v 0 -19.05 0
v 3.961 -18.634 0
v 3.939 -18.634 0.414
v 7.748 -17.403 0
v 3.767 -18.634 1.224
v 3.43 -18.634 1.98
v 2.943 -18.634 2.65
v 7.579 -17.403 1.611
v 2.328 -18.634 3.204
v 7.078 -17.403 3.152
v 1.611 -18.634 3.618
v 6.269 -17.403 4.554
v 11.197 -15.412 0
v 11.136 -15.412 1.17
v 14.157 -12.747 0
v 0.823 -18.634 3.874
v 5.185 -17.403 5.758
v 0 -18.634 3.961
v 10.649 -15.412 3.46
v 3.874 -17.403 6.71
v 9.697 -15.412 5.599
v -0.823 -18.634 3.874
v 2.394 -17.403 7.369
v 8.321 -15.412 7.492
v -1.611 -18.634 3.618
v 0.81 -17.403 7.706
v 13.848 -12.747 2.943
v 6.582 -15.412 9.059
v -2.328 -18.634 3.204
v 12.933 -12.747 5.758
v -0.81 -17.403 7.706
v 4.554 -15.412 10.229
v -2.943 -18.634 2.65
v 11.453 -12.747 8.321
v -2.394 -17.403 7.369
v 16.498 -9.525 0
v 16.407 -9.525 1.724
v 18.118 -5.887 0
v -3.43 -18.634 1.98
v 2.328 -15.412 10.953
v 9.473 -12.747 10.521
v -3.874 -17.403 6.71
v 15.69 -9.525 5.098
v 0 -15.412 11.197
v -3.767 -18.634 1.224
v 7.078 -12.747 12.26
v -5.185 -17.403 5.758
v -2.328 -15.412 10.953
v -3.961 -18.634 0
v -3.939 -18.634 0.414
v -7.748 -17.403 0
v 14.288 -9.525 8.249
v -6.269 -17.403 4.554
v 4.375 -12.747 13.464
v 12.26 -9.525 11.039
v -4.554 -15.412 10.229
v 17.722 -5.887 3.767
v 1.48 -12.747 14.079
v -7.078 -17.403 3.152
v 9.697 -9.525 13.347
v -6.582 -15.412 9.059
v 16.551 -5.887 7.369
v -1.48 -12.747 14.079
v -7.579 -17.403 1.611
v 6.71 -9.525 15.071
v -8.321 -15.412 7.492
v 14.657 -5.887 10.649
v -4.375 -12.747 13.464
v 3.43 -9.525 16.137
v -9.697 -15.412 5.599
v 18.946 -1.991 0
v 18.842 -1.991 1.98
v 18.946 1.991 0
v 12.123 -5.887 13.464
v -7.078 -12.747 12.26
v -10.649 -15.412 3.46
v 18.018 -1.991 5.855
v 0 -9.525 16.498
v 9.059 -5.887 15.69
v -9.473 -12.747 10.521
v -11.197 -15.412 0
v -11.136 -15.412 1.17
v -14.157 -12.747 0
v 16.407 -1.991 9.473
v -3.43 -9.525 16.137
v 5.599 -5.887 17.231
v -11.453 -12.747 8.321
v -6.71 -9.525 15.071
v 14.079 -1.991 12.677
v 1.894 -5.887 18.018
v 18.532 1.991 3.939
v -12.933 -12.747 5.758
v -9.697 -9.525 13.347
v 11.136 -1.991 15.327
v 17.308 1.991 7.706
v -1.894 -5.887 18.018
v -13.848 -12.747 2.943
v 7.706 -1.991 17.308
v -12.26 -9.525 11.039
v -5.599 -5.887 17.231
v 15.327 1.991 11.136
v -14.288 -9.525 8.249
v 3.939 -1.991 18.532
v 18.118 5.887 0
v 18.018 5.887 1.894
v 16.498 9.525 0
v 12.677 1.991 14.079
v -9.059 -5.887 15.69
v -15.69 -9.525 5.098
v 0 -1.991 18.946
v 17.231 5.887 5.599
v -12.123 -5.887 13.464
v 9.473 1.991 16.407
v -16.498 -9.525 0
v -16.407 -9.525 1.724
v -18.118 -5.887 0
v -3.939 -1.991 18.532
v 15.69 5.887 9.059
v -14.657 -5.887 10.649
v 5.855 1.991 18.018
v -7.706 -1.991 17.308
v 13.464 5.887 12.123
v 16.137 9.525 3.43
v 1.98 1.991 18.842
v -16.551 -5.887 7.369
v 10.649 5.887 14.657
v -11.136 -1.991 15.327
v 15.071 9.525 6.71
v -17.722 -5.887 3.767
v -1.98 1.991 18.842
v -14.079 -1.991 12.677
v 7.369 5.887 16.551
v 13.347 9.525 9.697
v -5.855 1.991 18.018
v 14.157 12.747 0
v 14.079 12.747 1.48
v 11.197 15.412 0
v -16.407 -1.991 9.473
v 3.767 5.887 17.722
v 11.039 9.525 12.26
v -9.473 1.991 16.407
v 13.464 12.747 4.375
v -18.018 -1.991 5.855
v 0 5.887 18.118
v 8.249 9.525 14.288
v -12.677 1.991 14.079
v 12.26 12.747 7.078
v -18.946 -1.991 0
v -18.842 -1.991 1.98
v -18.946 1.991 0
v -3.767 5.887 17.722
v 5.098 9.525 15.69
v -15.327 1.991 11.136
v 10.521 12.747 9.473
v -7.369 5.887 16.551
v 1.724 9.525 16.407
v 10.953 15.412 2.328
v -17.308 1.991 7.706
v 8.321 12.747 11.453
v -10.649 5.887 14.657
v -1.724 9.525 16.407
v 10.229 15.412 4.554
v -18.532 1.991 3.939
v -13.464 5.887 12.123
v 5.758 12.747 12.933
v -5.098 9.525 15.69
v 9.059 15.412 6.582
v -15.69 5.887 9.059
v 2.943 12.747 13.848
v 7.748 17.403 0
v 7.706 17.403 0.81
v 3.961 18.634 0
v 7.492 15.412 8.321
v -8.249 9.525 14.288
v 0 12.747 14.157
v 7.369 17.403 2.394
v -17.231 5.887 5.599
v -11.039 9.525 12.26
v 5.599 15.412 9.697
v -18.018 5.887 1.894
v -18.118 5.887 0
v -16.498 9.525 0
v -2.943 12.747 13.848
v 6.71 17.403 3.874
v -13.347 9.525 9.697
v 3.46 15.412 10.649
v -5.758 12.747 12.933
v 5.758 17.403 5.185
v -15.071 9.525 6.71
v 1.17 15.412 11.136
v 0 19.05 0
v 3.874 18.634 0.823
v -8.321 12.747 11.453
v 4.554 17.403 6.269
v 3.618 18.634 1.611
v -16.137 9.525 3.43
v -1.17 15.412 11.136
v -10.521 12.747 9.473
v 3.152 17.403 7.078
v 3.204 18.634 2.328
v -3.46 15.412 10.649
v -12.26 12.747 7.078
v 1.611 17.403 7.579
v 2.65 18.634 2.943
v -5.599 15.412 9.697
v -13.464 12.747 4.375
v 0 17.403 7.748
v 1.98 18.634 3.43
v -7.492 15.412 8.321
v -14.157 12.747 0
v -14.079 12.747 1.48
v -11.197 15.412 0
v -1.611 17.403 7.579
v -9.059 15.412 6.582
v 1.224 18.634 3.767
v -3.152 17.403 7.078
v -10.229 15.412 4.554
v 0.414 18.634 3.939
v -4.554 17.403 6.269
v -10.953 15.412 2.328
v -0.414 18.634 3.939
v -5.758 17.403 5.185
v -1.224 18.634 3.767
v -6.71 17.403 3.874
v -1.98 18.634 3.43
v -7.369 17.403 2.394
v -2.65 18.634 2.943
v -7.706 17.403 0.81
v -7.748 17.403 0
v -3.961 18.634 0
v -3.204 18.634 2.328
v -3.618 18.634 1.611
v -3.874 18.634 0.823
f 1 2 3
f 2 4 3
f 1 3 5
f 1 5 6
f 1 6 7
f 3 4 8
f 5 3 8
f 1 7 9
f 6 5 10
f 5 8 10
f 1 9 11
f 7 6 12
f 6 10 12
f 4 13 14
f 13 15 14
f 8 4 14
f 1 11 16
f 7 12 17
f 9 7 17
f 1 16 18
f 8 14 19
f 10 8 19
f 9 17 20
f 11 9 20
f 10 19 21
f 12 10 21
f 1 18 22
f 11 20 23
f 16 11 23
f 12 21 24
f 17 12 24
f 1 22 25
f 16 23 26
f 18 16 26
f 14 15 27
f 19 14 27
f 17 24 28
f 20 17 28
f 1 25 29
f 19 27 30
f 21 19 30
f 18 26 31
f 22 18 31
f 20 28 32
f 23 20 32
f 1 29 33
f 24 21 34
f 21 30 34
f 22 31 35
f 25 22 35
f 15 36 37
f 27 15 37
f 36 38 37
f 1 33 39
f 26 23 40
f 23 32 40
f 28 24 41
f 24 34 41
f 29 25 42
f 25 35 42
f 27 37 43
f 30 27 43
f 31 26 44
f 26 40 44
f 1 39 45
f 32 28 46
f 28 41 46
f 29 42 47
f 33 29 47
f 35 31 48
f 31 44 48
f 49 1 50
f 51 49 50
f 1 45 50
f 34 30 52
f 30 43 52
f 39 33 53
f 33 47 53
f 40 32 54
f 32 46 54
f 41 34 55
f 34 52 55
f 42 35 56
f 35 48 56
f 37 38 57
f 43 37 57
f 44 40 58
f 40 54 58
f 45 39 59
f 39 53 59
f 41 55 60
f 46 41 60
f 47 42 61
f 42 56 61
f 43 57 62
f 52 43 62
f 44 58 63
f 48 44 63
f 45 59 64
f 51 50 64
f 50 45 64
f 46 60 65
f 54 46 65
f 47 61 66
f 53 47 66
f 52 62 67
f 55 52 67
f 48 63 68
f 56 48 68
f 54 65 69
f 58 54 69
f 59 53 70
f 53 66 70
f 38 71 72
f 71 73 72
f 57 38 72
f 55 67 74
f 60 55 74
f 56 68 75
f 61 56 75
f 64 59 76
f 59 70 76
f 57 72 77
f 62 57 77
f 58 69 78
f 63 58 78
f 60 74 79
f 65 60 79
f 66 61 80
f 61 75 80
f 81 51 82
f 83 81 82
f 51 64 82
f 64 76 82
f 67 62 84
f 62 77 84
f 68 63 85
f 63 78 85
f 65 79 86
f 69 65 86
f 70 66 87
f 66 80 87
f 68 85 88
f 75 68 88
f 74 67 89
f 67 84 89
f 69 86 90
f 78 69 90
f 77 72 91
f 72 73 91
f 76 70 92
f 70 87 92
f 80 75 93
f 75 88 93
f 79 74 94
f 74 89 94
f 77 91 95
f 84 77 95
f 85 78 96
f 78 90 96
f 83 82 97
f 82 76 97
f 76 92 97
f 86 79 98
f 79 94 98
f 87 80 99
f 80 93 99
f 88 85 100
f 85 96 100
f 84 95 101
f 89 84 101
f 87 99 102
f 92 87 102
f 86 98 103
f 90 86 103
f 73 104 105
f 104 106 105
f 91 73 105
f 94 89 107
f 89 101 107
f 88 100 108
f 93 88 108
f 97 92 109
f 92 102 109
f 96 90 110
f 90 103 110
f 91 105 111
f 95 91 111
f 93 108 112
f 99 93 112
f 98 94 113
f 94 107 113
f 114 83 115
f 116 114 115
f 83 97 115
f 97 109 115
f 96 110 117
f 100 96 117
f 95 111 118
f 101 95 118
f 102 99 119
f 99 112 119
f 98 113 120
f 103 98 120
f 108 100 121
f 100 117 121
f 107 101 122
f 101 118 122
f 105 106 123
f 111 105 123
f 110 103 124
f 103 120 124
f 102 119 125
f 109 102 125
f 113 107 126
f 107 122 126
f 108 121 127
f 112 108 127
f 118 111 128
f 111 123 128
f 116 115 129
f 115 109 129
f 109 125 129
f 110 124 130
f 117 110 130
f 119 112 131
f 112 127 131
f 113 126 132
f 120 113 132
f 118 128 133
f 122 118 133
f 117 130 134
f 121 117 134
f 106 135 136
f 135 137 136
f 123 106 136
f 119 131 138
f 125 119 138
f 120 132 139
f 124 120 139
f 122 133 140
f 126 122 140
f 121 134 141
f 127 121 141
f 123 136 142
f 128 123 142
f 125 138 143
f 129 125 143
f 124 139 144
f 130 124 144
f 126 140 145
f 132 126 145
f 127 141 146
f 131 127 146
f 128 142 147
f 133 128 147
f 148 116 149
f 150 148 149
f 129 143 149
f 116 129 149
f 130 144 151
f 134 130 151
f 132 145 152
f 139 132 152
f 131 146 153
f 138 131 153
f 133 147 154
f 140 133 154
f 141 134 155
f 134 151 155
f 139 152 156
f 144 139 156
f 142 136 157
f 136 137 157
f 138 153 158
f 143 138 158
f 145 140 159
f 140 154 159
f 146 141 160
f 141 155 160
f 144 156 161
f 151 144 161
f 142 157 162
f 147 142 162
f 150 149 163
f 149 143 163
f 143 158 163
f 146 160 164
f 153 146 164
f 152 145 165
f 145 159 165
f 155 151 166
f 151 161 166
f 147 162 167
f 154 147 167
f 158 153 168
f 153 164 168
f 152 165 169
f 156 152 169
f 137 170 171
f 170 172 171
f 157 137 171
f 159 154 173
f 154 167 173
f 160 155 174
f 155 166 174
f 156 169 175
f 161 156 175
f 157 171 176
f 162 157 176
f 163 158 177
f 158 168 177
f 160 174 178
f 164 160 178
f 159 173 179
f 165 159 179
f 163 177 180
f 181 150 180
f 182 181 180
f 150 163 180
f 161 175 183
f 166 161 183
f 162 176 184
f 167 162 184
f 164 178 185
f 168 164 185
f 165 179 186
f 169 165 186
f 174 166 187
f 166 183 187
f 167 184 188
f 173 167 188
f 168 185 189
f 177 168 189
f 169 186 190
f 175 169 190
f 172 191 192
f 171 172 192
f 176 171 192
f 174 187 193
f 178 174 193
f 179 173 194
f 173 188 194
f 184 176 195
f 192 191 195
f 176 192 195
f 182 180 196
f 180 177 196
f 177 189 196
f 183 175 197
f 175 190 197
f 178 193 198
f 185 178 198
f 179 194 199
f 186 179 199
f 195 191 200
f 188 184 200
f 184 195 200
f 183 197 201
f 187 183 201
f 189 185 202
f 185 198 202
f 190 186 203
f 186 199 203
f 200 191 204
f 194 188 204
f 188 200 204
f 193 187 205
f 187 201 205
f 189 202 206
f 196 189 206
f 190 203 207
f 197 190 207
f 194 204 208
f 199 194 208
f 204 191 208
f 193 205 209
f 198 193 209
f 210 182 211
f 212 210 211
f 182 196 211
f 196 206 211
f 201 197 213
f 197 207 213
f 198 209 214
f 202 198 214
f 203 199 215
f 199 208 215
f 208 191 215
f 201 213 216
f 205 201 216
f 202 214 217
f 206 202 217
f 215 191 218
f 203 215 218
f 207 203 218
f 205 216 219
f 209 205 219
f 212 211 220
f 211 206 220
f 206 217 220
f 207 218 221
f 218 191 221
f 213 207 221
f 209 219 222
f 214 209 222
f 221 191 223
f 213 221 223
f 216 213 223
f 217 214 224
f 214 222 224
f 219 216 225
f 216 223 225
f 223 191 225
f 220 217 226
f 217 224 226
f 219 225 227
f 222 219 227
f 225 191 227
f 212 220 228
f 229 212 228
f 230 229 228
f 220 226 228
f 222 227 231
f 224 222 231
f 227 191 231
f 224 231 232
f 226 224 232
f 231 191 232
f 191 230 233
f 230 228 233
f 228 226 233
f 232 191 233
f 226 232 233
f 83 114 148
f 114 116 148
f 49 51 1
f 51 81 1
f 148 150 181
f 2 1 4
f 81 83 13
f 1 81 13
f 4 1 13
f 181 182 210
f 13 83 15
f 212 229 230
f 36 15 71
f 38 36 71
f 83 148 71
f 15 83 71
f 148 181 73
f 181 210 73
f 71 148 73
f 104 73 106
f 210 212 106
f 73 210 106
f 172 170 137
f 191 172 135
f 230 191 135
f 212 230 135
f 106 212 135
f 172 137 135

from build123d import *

# Parameters (mm, degrees)
F2_W     = 29.3561853468
F2_H     = 76.5563324094
F3_DEPTH = 50.8
F4_W     = 76.2685239315
F4_H     = 38.5659746826
F5_DEPTH = 25.4


with BuildPart() as f1:
    # F0 (on Top) → F1 (revolve)
    with BuildSketch(Plane.XY):
        with BuildLine():
            Line((0, 19.05), (0, -19.05))
            ThreePointArc((0, -19.05), (19.05, 0), (0, 19.05))
        make_face()
    revolve(axis=Axis((0, 0, 0), (0, -1, 0)))

    # F2 (on Top) → F3 (cut)
    with BuildSketch(Plane.XY):
        with Locations((14.6780926734, -3.4536682069)):
            Rectangle(F2_W, F2_H)
    extrude(amount=-F3_DEPTH, mode=Mode.SUBTRACT)

    # F4 (on Right) → F5 (cut)
    with BuildSketch(Plane.YZ):
        with Locations((3.5975724459, -19.2829873413)):
            Rectangle(F4_W, F4_H)
    extrude(amount=-F5_DEPTH, mode=Mode.SUBTRACT)


solid = f1.part
